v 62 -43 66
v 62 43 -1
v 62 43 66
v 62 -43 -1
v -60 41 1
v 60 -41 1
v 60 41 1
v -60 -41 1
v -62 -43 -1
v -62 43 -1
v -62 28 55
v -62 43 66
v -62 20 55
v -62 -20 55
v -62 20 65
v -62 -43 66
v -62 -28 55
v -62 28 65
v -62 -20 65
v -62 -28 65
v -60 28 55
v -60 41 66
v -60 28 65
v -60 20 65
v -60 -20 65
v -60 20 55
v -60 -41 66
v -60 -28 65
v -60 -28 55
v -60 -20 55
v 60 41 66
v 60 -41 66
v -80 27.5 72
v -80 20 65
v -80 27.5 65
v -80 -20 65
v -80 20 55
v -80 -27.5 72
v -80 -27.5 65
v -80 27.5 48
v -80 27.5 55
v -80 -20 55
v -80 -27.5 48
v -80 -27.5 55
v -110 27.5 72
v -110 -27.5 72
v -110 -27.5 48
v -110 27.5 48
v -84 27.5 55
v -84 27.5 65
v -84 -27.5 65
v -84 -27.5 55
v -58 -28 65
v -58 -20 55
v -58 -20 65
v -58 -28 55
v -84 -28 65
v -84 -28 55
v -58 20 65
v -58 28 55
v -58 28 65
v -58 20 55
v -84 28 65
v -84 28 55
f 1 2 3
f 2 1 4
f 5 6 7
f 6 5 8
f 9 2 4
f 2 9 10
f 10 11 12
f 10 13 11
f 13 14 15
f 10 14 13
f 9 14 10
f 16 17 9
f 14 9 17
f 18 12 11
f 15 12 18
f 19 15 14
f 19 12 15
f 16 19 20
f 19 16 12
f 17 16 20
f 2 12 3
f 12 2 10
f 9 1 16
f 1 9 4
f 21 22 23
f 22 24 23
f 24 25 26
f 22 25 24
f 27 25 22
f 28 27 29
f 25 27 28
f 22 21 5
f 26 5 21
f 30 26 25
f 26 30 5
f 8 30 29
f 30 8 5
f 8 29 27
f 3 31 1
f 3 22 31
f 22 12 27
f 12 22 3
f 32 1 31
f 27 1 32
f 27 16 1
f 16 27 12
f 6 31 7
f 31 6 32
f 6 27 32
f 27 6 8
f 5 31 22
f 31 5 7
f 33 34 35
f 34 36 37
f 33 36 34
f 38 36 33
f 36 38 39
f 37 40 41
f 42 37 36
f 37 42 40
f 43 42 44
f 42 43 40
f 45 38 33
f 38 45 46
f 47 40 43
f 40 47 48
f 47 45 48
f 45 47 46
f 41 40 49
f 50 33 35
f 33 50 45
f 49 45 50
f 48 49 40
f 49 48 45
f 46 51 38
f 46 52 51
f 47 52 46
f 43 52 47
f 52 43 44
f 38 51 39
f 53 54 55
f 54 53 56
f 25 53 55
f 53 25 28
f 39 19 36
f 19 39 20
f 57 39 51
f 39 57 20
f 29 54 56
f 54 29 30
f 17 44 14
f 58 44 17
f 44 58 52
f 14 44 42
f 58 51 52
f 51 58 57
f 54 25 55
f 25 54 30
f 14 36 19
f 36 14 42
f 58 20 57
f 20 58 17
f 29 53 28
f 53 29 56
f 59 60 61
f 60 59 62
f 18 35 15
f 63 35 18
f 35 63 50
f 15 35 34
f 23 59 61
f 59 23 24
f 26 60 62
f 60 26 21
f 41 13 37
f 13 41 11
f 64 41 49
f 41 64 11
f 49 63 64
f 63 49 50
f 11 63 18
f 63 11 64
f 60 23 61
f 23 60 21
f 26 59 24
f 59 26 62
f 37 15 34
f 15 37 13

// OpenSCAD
// Original reconstruction generated from native task USD; MIT. Units:mm.
part="Collector";
$fn=64;
module BaseRaw(){union(){
multmatrix([[0.025, 0.0, 0.0, 125.0], [0.0, 0.19, 0.0, 0.0], [0.0, 0.0, 0.29, 145.0], [0.0, 0.0, 0.0, 1.0]]) cube([1000.0,1000.0,1000.0],center=true);
multmatrix([[0.22, 0.0, 0.0, 10.0], [0.0, 0.008, 0.0, -96.0], [0.0, 0.0, 0.06, 255.0], [0.0, 0.0, 0.0, 1.0]]) cube([1000.0,1000.0,1000.0],center=true);
multmatrix([[0.025, 0.0, 0.0, 102.5], [0.0, 0.008, 0.0, -96.0], [0.0, 0.0, 0.215, 117.5], [0.0, 0.0, 0.0, 1.0]]) cube([1000.0,1000.0,1000.0],center=true);
multmatrix([[0.22, 0.0, 0.0, 10.0], [0.0, 0.008, 0.0, 96.0], [0.0, 0.0, 0.06, 255.0], [0.0, 0.0, 0.0, 1.0]]) cube([1000.0,1000.0,1000.0],center=true);
multmatrix([[0.025, 0.0, 0.0, 102.5], [0.0, 0.008, 0.0, 96.0], [0.0, 0.0, 0.215, 117.5], [0.0, 0.0, 0.0, 1.0]]) cube([1000.0,1000.0,1000.0],center=true);
multmatrix([[0.28, 0.0, 0.0, 0.0], [0.0, 0.17, 0.0, 0.0], [0.0, 0.0, 0.008, 4.0], [0.0, 0.0, 0.0, 1.0]]) cube([1000.0,1000.0,1000.0],center=true);
multmatrix([[0.012, 0.0, 0.0, -95.0], [0.0, 0.19, 0.0, 0.0], [0.0, 0.0, 0.024, 217.0], [0.0, 0.0, 0.0, 1.0]]) cube([1000.0,1000.0,1000.0],center=true);
multmatrix([[0.02, 0.0, 0.0, -95.0], [0.0, 0.034, 0.0, 0.0], [0.0, 0.0, 0.018, 197.0], [0.0, 0.0, 0.0, 1.0]]) cube([1000.0,1000.0,1000.0],center=true);
multmatrix([[1.0, 0.0, 0.0, -95.0], [0.0, 1.0, 0.0, 0.0], [0.0, 0.0, 1.0, 180.0], [0.0, 0.0, 0.0, 1.0]]) cylinder(r=6.0,h=18.0,center=true);
multmatrix([[0.044, 0.0, 0.0, -115.0], [0.0, 0.004, 0.0, -33.0], [0.0, 0.0, 0.001, 8.5], [0.0, 0.0, 0.0, 1.0]]) cube([1000.0,1000.0,1000.0],center=true);
multmatrix([[0.044, 0.0, 0.0, -115.0], [0.0, 0.004, 0.0, -22.0], [0.0, 0.0, 0.001, 8.5], [0.0, 0.0, 0.0, 1.0]]) cube([1000.0,1000.0,1000.0],center=true);
multmatrix([[0.044, 0.0, 0.0, -115.0], [0.0, 0.004, 0.0, -11.0], [0.0, 0.0, 0.001, 8.5], [0.0, 0.0, 0.0, 1.0]]) cube([1000.0,1000.0,1000.0],center=true);
multmatrix([[0.044, 0.0, 0.0, -115.0], [0.0, 0.004, 0.0, 0.0], [0.0, 0.0, 0.001, 8.5], [0.0, 0.0, 0.0, 1.0]]) cube([1000.0,1000.0,1000.0],center=true);
multmatrix([[0.044, 0.0, 0.0, -115.0], [0.0, 0.004, 0.0, 11.0], [0.0, 0.0, 0.001, 8.5], [0.0, 0.0, 0.0, 1.0]]) cube([1000.0,1000.0,1000.0],center=true);
multmatrix([[0.044, 0.0, 0.0, -115.0], [0.0, 0.004, 0.0, 22.0], [0.0, 0.0, 0.001, 8.5], [0.0, 0.0, 0.0, 1.0]]) cube([1000.0,1000.0,1000.0],center=true);
multmatrix([[0.044, 0.0, 0.0, -115.0], [0.0, 0.004, 0.0, 33.0], [0.0, 0.0, 0.001, 8.5], [0.0, 0.0, 0.0, 1.0]]) cube([1000.0,1000.0,1000.0],center=true);
multmatrix([[1.0, 0.0, 0.0, 155.0], [0.0, 1.0, 0.0, 40.0], [0.0, 0.0, 1.0, 100.0], [0.0, 0.0, 0.0, 1.0]]) cylinder(r=25.0,h=180.0,center=true);
multmatrix([[1.0, 0.0, 0.0, 155.0], [0.0, 1.0, 0.0, 40.0], [0.0, 0.0, 1.0, 194.0], [0.0, 0.0, 0.0, 1.0]]) cylinder(r=27.0,h=8.0,center=true);
multmatrix([[1.0, 0.0, 0.0, 155.0], [0.0, 1.0, 0.0, 40.0], [0.0, 0.0, 1.0, 5.0], [0.0, 0.0, 0.0, 1.0]]) cylinder(r=25.0,h=10.0,center=true);
multmatrix([[0.05, 0.0, 0.0, 90.0], [0.0, 0.125, 0.0, 0.0], [0.0, 0.0, 0.13, 73.0], [0.0, 0.0, 0.0, 1.0]]) cube([1000.0,1000.0,1000.0],center=true);
multmatrix([[0.125, 0.0, 0.0, -15.0], [0.0, 0.03, 0.0, -80.0], [0.0, 0.0, 0.105, 60.0], [0.0, 0.0, 0.0, 1.0]]) cube([1000.0,1000.0,1000.0],center=true);
multmatrix([[0.02, 0.0, 0.0, 40.0], [0.0, 0.03, 0.0, -80.0], [0.0, 0.0, 0.115, 169.5], [0.0, 0.0, 0.0, 1.0]]) cube([1000.0,1000.0,1000.0],center=true);
multmatrix([[0.125, 0.0, 0.0, -15.0], [0.0, 0.03, 0.0, 80.0], [0.0, 0.0, 0.105, 60.0], [0.0, 0.0, 0.0, 1.0]]) cube([1000.0,1000.0,1000.0],center=true);
multmatrix([[0.02, 0.0, 0.0, 40.0], [0.0, 0.03, 0.0, 80.0], [0.0, 0.0, 0.115, 169.5], [0.0, 0.0, 0.0, 1.0]]) cube([1000.0,1000.0,1000.0],center=true);
multmatrix([[1.0, 0.0, 0.0, -500.0], [0.0, 1.0, 0.0, 0.0], [0.0, 0.0, 1.0, -747.5], [0.0, 0.0, 0.0, 1.0]]) polyhedron(points=[[423.0000078678131, -48.99999871850014, 756.5000057220459], [423.0000078678131, -71.00000232458115, 756.5000057220459], [423.0000078678131, -71.00000232458115, 772.4999785423279], [423.0000078678131, -64.99999761581421, 772.4999785423279], [423.0000078678131, -48.99999871850014, 759.5000267028809], [546.999990940094, -48.99999871850014, 756.5000057220459], [546.999990940094, -71.00000232458115, 756.5000057220459], [546.999990940094, -71.00000232458115, 772.4999785423279], [546.999990940094, -64.99999761581421, 772.4999785423279], [546.999990940094, -48.99999871850014, 759.5000267028809]],faces=[[4, 3, 2, 1, 0], [5, 6, 7, 8, 9], [0, 1, 6, 5], [1, 2, 7, 6], [2, 3, 8, 7], [3, 4, 9, 8], [4, 0, 5, 9]],convexity=12);
multmatrix([[1.0, 0.0, 0.0, -500.0], [0.0, 1.0, 0.0, 0.0], [0.0, 0.0, 1.0, -747.5], [0.0, 0.0, 0.0, 1.0]]) polyhedron(points=[[423.0000078678131, 48.99999871850014, 756.5000057220459], [423.0000078678131, 71.00000232458115, 756.5000057220459], [423.0000078678131, 71.00000232458115, 772.4999785423279], [423.0000078678131, 64.99999761581421, 772.4999785423279], [423.0000078678131, 48.99999871850014, 759.5000267028809], [546.999990940094, 48.99999871850014, 756.5000057220459], [546.999990940094, 71.00000232458115, 756.5000057220459], [546.999990940094, 71.00000232458115, 772.4999785423279], [546.999990940094, 64.99999761581421, 772.4999785423279], [546.999990940094, 48.99999871850014, 759.5000267028809]],faces=[[0, 1, 2, 3, 4], [9, 8, 7, 6, 5], [5, 6, 1, 0], [6, 7, 2, 1], [7, 8, 3, 2], [8, 9, 4, 3], [9, 5, 0, 4]],convexity=12);
multmatrix([[0.006, 0.0, 0.0, 56.0], [0.0, 0.1, 0.0, 0.0], [0.0, 0.0, 0.015, 15.0], [0.0, 0.0, 0.0, 1.0]]) cube([1000.0,1000.0,1000.0],center=true);
multmatrix([[0.0031846, -0.0003921, 0.0, -41.688601], [0.0003137, 0.0039807, 0.0, 1.8035154], [0.0, 0.0, 0.005, 232.5], [0.0, 0.0, 0.0, 1.0]]) cube([1000.0,1000.0,1000.0],center=true);
multmatrix([[0.0030622, -0.0011611, 0.0, -42.3922978], [0.0009289, 0.0038278, 0.0, 5.3412381], [0.0, 0.0, 0.005, 232.5], [0.0, 0.0, 0.0, 1.0]]) cube([1000.0,1000.0,1000.0],center=true);
multmatrix([[0.0028221, -0.0018856, 0.0, -43.7726487], [0.0015085, 0.0035277, 0.0, 8.6737], [0.0, 0.0, 0.005, 232.5], [0.0, 0.0, 0.0, 1.0]]) cube([1000.0,1000.0,1000.0],center=true);
multmatrix([[-0.0028221, -0.0018856, 0.0, -76.2273513], [0.0015085, -0.0035277, 0.0, 8.6737], [0.0, 0.0, 0.005, 232.5], [0.0, 0.0, 0.0, 1.0]]) cube([1000.0,1000.0,1000.0],center=true);
multmatrix([[-0.0030622, -0.0011611, 0.0, -77.6077022], [0.0009289, -0.0038278, 0.0, 5.3412381], [0.0, 0.0, 0.005, 232.5], [0.0, 0.0, 0.0, 1.0]]) cube([1000.0,1000.0,1000.0],center=true);
multmatrix([[-0.0031846, -0.0003921, 0.0, -78.311399], [0.0003137, -0.0039807, 0.0, 1.8035154], [0.0, 0.0, 0.005, 232.5], [0.0, 0.0, 0.0, 1.0]]) cube([1000.0,1000.0,1000.0],center=true);
multmatrix([[-0.0031846, 0.0003921, 0.0, -78.311399], [-0.0003137, -0.0039807, 0.0, -1.8035154], [0.0, 0.0, 0.005, 232.5], [0.0, 0.0, 0.0, 1.0]]) cube([1000.0,1000.0,1000.0],center=true);
multmatrix([[-0.0030622, 0.0011611, 0.0, -77.6077022], [-0.0009289, -0.0038278, 0.0, -5.3412381], [0.0, 0.0, 0.005, 232.5], [0.0, 0.0, 0.0, 1.0]]) cube([1000.0,1000.0,1000.0],center=true);
multmatrix([[-0.0028221, 0.0018856, 0.0, -76.2273513], [-0.0015085, -0.0035277, 0.0, -8.6737], [0.0, 0.0, 0.005, 232.5], [0.0, 0.0, 0.0, 1.0]]) cube([1000.0,1000.0,1000.0],center=true);
multmatrix([[0.0028221, 0.0018856, 0.0, -43.7726487], [-0.0015085, 0.0035277, 0.0, -8.6737], [0.0, 0.0, 0.005, 232.5], [0.0, 0.0, 0.0, 1.0]]) cube([1000.0,1000.0,1000.0],center=true);
multmatrix([[0.0030622, 0.0011611, 0.0, -42.3922978], [-0.0009289, 0.0038278, 0.0, -5.3412381], [0.0, 0.0, 0.005, 232.5], [0.0, 0.0, 0.0, 1.0]]) cube([1000.0,1000.0,1000.0],center=true);
multmatrix([[0.0031846, 0.0003921, 0.0, -41.688601], [-0.0003137, 0.0039807, 0.0, -1.8035154], [0.0, 0.0, 0.005, 232.5], [0.0, 0.0, 0.0, 1.0]]) cube([1000.0,1000.0,1000.0],center=true);
multmatrix([[0.11, 0.0, 0.0, -55.0], [0.0, 0.008, 0.0, -85.0], [0.0, 0.0, 0.008, 228.0], [0.0, 0.0, 0.0, 1.0]]) cube([1000.0,1000.0,1000.0],center=true);
multmatrix([[0.11, 0.0, 0.0, -55.0], [0.0, 0.008, 0.0, 85.0], [0.0, 0.0, 0.008, 228.0], [0.0, 0.0, 0.0, 1.0]]) cube([1000.0,1000.0,1000.0],center=true);
multmatrix([[0.004, 0.0, 0.0, -80.0], [0.0, 0.176, 0.0, 0.0], [0.0, 0.0, 0.004, 227.0], [0.0, 0.0, 0.0, 1.0]]) cube([1000.0,1000.0,1000.0],center=true);
multmatrix([[0.004, 0.0, 0.0, -80.0], [0.0, 0.016, 0.0, 0.0], [0.0, 0.0, 0.008, 231.0], [0.0, 0.0, 0.0, 1.0]]) cube([1000.0,1000.0,1000.0],center=true);
multmatrix([[0.004, 0.0, 0.0, -40.0], [0.0, 0.176, 0.0, 0.0], [0.0, 0.0, 0.004, 227.0], [0.0, 0.0, 0.0, 1.0]]) cube([1000.0,1000.0,1000.0],center=true);
multmatrix([[0.004, 0.0, 0.0, -40.0], [0.0, 0.016, 0.0, 0.0], [0.0, 0.0, 0.008, 231.0], [0.0, 0.0, 0.0, 1.0]]) cube([1000.0,1000.0,1000.0],center=true);
}}
module HingeShaftRaw(){union(){
multmatrix([[1.0, 0.0, 0.0, 50.0], [0.0, 1.0, 0.0, 0.0], [0.0, 0.0, 1.0, 235.0], [0.0, 0.0, 0.0, 1.0]]) rotate([90,0,0]) cylinder(r=3.0,h=216.0,center=true);
}}
module HeadRaw(){union(){
multmatrix([[0.22, 0.0, 0.0, -20.0], [0.0, 0.17, 0.0, 0.0], [0.0, 0.0, 0.018, 265.0], [0.0, 0.0, 0.0, 1.0]]) cube([1000.0,1000.0,1000.0],center=true);
multmatrix([[0.075, 0.0, 0.0, -55.0], [0.0, 0.005, 0.0, -19.5], [0.0, 0.0, 0.003, 232.0], [0.0, 0.0, 0.0, 1.0]]) cube([1000.0,1000.0,1000.0],center=true);
multmatrix([[0.075, 0.0, 0.0, -55.0], [0.0, 0.005, 0.0, 19.5], [0.0, 0.0, 0.003, 232.0], [0.0, 0.0, 0.0, 1.0]]) cube([1000.0,1000.0,1000.0],center=true);
multmatrix([[0.006, 0.0, 0.0, -95.0], [0.0, 0.041, 0.0, 0.0], [0.0, 0.0, 0.006, 234.0], [0.0, 0.0, 0.0, 1.0]]) cube([1000.0,1000.0,1000.0],center=true);
multmatrix([[0.006, 0.0, 0.0, -95.0], [0.0, 0.006, 0.0, -19.5], [0.0, 0.0, 0.025, 248.0], [0.0, 0.0, 0.0, 1.0]]) cube([1000.0,1000.0,1000.0],center=true);
multmatrix([[0.018, 0.0, 0.0, 50.0], [0.0, 0.012, 0.0, -77.0], [0.0, 0.0, 0.044, 245.0], [0.0, 0.0, 0.0, 1.0]]) cube([1000.0,1000.0,1000.0],center=true);
multmatrix([[0.006, 0.0, 0.0, -95.0], [0.0, 0.006, 0.0, 19.5], [0.0, 0.0, 0.025, 248.0], [0.0, 0.0, 0.0, 1.0]]) cube([1000.0,1000.0,1000.0],center=true);
multmatrix([[0.018, 0.0, 0.0, 50.0], [0.0, 0.012, 0.0, 77.0], [0.0, 0.0, 0.044, 245.0], [0.0, 0.0, 0.0, 1.0]]) cube([1000.0,1000.0,1000.0],center=true);
multmatrix([[1.0, 0.0, 0.0, -120.0], [0.0, 1.0, 0.0, 0.0], [0.0, 0.0, 1.0, 280.0], [0.0, 0.0, 0.0, 1.0]]) rotate([90,0,0]) cylinder(r=9.0,h=240.0,center=true);
multmatrix([[0.012, 0.0, 0.0, -120.0], [0.0, 0.012, 0.0, -70.0], [0.0, 0.0, 0.035, 262.0], [0.0, 0.0, 0.0, 1.0]]) cube([1000.0,1000.0,1000.0],center=true);
multmatrix([[0.012, 0.0, 0.0, -120.0], [0.0, 0.012, 0.0, 70.0], [0.0, 0.0, 0.035, 262.0], [0.0, 0.0, 0.0, 1.0]]) cube([1000.0,1000.0,1000.0],center=true);
}}
module CollectorRaw(){union(){
multmatrix([[0.124, 0.0, 0.0, 0.0], [0.0, 0.086, 0.0, 0.0], [0.0, 0.0, 0.002, 0.0], [0.0, 0.0, 0.0, 1.0]]) cube([1000.0,1000.0,1000.0],center=true);
multmatrix([[0.002, 0.0, 0.0, -61.0], [0.0, 0.086, 0.0, 0.0], [0.0, 0.0, 0.065, 33.5], [0.0, 0.0, 0.0, 1.0]]) cube([1000.0,1000.0,1000.0],center=true);
multmatrix([[0.12, 0.0, 0.0, 0.0], [0.0, 0.002, 0.0, -42.0], [0.0, 0.0, 0.065, 33.5], [0.0, 0.0, 0.0, 1.0]]) cube([1000.0,1000.0,1000.0],center=true);
multmatrix([[0.002, 0.0, 0.0, 61.0], [0.0, 0.086, 0.0, 0.0], [0.0, 0.0, 0.065, 33.5], [0.0, 0.0, 0.0, 1.0]]) cube([1000.0,1000.0,1000.0],center=true);
multmatrix([[0.12, 0.0, 0.0, 0.0], [0.0, 0.002, 0.0, 42.0], [0.0, 0.0, 0.065, 33.5], [0.0, 0.0, 0.0, 1.0]]) cube([1000.0,1000.0,1000.0],center=true);
multmatrix([[0.03, 0.0, 0.0, -95.0], [0.0, 0.055, 0.0, 0.0], [0.0, 0.0, 0.024, 60.0], [0.0, 0.0, 0.0, 1.0]]) cube([1000.0,1000.0,1000.0],center=true);
multmatrix([[0.026, 0.0, 0.0, -71.0], [0.0, 0.008, 0.0, -24.0], [0.0, 0.0, 0.01, 60.0], [0.0, 0.0, 0.0, 1.0]]) cube([1000.0,1000.0,1000.0],center=true);
multmatrix([[0.026, 0.0, 0.0, -71.0], [0.0, 0.008, 0.0, 24.0], [0.0, 0.0, 0.01, 60.0], [0.0, 0.0, 0.0, 1.0]]) cube([1000.0,1000.0,1000.0],center=true);
}}
module CapsuleRaw(){union(){
multmatrix([[1.0, 0.0, 0.0, 0.0], [0.0, 1.0, 0.0, 0.0], [0.0, 0.0, 1.0, 0.0], [0.0, 0.0, 0.0, 1.0]]) polyhedron(points=[[12.000000104308128, 0.0, 0.0], [11.769423261284828, 2.341083949431777, 0.0], [11.086554266512394, 4.592201206833124, 0.0], [9.977634996175766, 6.666842848062515, 0.0], [8.4852809086442, 8.4852809086442, 0.0], [6.666842848062515, 9.977634996175766, 0.0], [4.592201206833124, 11.086554266512394, 0.0], [2.341083949431777, 11.769423261284828, 0.0], [7.347880536484578e-16, 12.000000104308128, 0.0], [-2.341083949431777, 11.769423261284828, 0.0], [-4.592201206833124, 11.086554266512394, 0.0], [-6.666842848062515, 9.977634996175766, 0.0], [-8.4852809086442, 8.4852809086442, 0.0], [-9.977634996175766, 6.666842848062515, 0.0], [-11.086554266512394, 4.592201206833124, 0.0], [-11.769423261284828, 2.341083949431777, 0.0], [-12.000000104308128, 1.4695761072969157e-15, 0.0], [-11.769423261284828, -2.341083949431777, 0.0], [-11.086554266512394, -4.592201206833124, 0.0], [-9.977634996175766, -6.666842848062515, 0.0], [-8.4852809086442, -8.4852809086442, 0.0], [-6.666842848062515, -9.977634996175766, 0.0], [-4.592201206833124, -11.086554266512394, 0.0], [-2.341083949431777, -11.769423261284828, 0.0], [-2.2043641609453735e-15, -12.000000104308128, 0.0], [2.341083949431777, -11.769423261284828, 0.0], [4.592201206833124, -11.086554266512394, 0.0], [6.666842848062515, -9.977634996175766, 0.0], [8.4852809086442, -8.4852809086442, 0.0], [9.977634996175766, -6.666842848062515, 0.0], [11.086554266512394, -4.592201206833124, 0.0], [11.769423261284828, -2.341083949431777, 0.0], [16.499999910593033, 0.0, 26.000000536441803], [16.182957217097282, 3.218990284949541, 26.000000536441803], [15.24401269853115, 6.314276717603207, 26.000000536441803], [13.719248585402966, 9.166908450424671, 26.000000536441803], [11.667261831462383, 11.667261831462383, 26.000000536441803], [9.166908450424671, 13.719248585402966, 26.000000536441803], [6.314276717603207, 15.24401269853115, 26.000000536441803], [3.218990284949541, 16.182957217097282, 26.000000536441803], [1.0103335996160237e-15, 16.499999910593033, 26.000000536441803], [-3.218990284949541, 16.182957217097282, 26.000000536441803], [-6.314276717603207, 15.24401269853115, 26.000000536441803], [-9.166908450424671, 13.719248585402966, 26.000000536441803], [-11.667261831462383, 11.667261831462383, 26.000000536441803], [-13.719248585402966, 9.166908450424671, 26.000000536441803], [-15.24401269853115, 6.314276717603207, 26.000000536441803], [-16.182957217097282, 3.218990284949541, 26.000000536441803], [-16.499999910593033, 2.0206671992320473e-15, 26.000000536441803], [-16.182957217097282, -3.218990284949541, 26.000000536441803], [-15.24401269853115, -6.314276717603207, 26.000000536441803], [-13.719248585402966, -9.166908450424671, 26.000000536441803], [-11.667261831462383, -11.667261831462383, 26.000000536441803], [-9.166908450424671, -13.719248585402966, 26.000000536441803], [-6.314276717603207, -15.24401269853115, 26.000000536441803], [-3.218990284949541, -16.182957217097282, 26.000000536441803], [-3.0310009022456476e-15, -16.499999910593033, 26.000000536441803], [3.218990284949541, -16.182957217097282, 26.000000536441803], [6.314276717603207, -15.24401269853115, 26.000000536441803], [9.166908450424671, -13.719248585402966, 26.000000536441803], [11.667261831462383, -11.667261831462383, 26.000000536441803], [13.719248585402966, -9.166908450424671, 26.000000536441803], [15.24401269853115, -6.314276717603207, 26.000000536441803], [16.182957217097282, -3.218990284949541, 26.000000536441803]],faces=[[32, 33, 1, 0], [33, 34, 2, 1], [34, 35, 3, 2], [35, 36, 4, 3], [36, 37, 5, 4], [37, 38, 6, 5], [38, 39, 7, 6], [39, 40, 8, 7], [40, 41, 9, 8], [41, 42, 10, 9], [42, 43, 11, 10], [43, 44, 12, 11], [44, 45, 13, 12], [45, 46, 14, 13], [46, 47, 15, 14], [47, 48, 16, 15], [48, 49, 17, 16], [49, 50, 18, 17], [50, 51, 19, 18], [51, 52, 20, 19], [52, 53, 21, 20], [53, 54, 22, 21], [54, 55, 23, 22], [55, 56, 24, 23], [56, 57, 25, 24], [57, 58, 26, 25], [58, 59, 27, 26], [59, 60, 28, 27], [60, 61, 29, 28], [61, 62, 30, 29], [62, 63, 31, 30], [63, 32, 0, 31], [0, 1, 2, 3, 4, 5, 6, 7, 8, 9, 10, 11, 12, 13, 14, 15, 16, 17, 18, 19, 20, 21, 22, 23, 24, 25, 26, 27, 28, 29, 30, 31], [63, 62, 61, 60, 59, 58, 57, 56, 55, 54, 53, 52, 51, 50, 49, 48, 47, 46, 45, 44, 43, 42, 41, 40, 39, 38, 37, 36, 35, 34, 33, 32]],convexity=12);
multmatrix([[1.0, 0.0, 0.0, 0.0], [0.0, 1.0, 0.0, 0.0], [0.0, 0.0, 1.0, 26.9], [0.0, 0.0, 0.0, 1.0]]) cylinder(r=18.5,h=1.8,center=true);
multmatrix([[1.0, 0.0, 0.0, 0.0], [0.0, 1.0, 0.0, 0.0], [0.0, 0.0, 1.0, 28.0], [0.0, 0.0, 0.0, 1.0]]) cylinder(r=16.0,h=0.3,center=true);
}}
module RecyclingTrayRaw(){union(){
multmatrix([[0.308, 0.0, 0.0, 0.0], [0.0, 0.308, 0.0, 0.0], [0.0, 0.0, 0.004, 2.0], [0.0, 0.0, 0.0, 1.0]]) cube([1000.0,1000.0,1000.0],center=true);
multmatrix([[0.004, 0.0, 0.0, -152.0], [0.0, 0.308, 0.0, 0.0], [0.0, 0.0, 0.055, 31.5], [0.0, 0.0, 0.0, 1.0]]) cube([1000.0,1000.0,1000.0],center=true);
multmatrix([[0.3, 0.0, 0.0, 0.0], [0.0, 0.004, 0.0, -152.0], [0.0, 0.0, 0.055, 31.5], [0.0, 0.0, 0.0, 1.0]]) cube([1000.0,1000.0,1000.0],center=true);
multmatrix([[0.004, 0.0, 0.0, 152.0], [0.0, 0.308, 0.0, 0.0], [0.0, 0.0, 0.055, 31.5], [0.0, 0.0, 0.0, 1.0]]) cube([1000.0,1000.0,1000.0],center=true);
multmatrix([[0.3, 0.0, 0.0, 0.0], [0.0, 0.004, 0.0, 152.0], [0.0, 0.0, 0.055, 31.5], [0.0, 0.0, 0.0, 1.0]]) cube([1000.0,1000.0,1000.0],center=true);
}}
module FreshStandRaw(){union(){
multmatrix([[1.0, 0.0, 0.0, 0.0], [0.0, 1.0, 0.0, 0.0], [0.0, 0.0, 1.0, 2.0], [0.0, 0.0, 0.0, 1.0]]) cylinder(r=25.0,h=4.0,center=true);
multmatrix([[1.0, 0.0, 0.0, 0.0], [0.0, 1.0, 0.0, 0.0], [0.0, 0.0, 1.0, 37.0], [0.0, 0.0, 0.0, 1.0]]) cylinder(r=9.0,h=66.0,center=true);
}}
hinge=[50.00000000000004, 0.0, 235.0];
module HingeBore(){translate(hinge) rotate([90,0,0]) cylinder(d=6.2,h=240,center=true);}
module StopMountBores(){for(x=[-16,16]) translate(hinge+[x,0,20]) rotate([90,0,0]) cylinder(d=3.4,h=240,center=true);}
module ArmMountBores(){for(x=[-5,5]) translate(hinge+[x,0,6]) rotate([90,0,0]) cylinder(d=3.4,h=180,center=true);}
module Base(){difference(){BaseRaw();HingeBore();StopMountBores();}}
module Head(){difference(){HeadRaw();HingeBore();ArmMountBores();}}
module HingeShaft(){HingeShaftRaw();}
module Collector(){CollectorRaw();}
module Capsule(){CapsuleRaw();}
module RecyclingTray(){RecyclingTrayRaw();}
module FreshStand(){FreshStandRaw();}
module MachineAssembly(open_angle=0){Base();translate(hinge) rotate([0,open_angle,0]) translate(-hinge) Head();HingeShaft();}
module BaseFront(){intersection(){Base();translate([-1000,-1000,-1000]) cube([1000,2000,2000]);}}
module BaseRear(){intersection(){Base();translate([0,-1000,-1000]) cube([1000,2000,2000]);}}
module HeadLeft(){intersection(){Head();translate([-1000,0,-1000]) cube([2000,1000,2000]);}}
module HeadRight(){intersection(){Head();translate([-1000,-1000,-1000]) cube([2000,1000,2000]);}}
if(part=="Base") Base();
if(part=="HingeShaft") HingeShaft();
if(part=="Head") Head();
if(part=="Collector") Collector();
if(part=="Capsule") Capsule();
if(part=="RecyclingTray") RecyclingTray();
if(part=="FreshStand") FreshStand();
if(part=="BaseFront") BaseFront();
if(part=="BaseRear") BaseRear();
if(part=="HeadLeft") HeadLeft();
if(part=="HeadRight") HeadRight();
if(part=="MachineAssembly") MachineAssembly();
